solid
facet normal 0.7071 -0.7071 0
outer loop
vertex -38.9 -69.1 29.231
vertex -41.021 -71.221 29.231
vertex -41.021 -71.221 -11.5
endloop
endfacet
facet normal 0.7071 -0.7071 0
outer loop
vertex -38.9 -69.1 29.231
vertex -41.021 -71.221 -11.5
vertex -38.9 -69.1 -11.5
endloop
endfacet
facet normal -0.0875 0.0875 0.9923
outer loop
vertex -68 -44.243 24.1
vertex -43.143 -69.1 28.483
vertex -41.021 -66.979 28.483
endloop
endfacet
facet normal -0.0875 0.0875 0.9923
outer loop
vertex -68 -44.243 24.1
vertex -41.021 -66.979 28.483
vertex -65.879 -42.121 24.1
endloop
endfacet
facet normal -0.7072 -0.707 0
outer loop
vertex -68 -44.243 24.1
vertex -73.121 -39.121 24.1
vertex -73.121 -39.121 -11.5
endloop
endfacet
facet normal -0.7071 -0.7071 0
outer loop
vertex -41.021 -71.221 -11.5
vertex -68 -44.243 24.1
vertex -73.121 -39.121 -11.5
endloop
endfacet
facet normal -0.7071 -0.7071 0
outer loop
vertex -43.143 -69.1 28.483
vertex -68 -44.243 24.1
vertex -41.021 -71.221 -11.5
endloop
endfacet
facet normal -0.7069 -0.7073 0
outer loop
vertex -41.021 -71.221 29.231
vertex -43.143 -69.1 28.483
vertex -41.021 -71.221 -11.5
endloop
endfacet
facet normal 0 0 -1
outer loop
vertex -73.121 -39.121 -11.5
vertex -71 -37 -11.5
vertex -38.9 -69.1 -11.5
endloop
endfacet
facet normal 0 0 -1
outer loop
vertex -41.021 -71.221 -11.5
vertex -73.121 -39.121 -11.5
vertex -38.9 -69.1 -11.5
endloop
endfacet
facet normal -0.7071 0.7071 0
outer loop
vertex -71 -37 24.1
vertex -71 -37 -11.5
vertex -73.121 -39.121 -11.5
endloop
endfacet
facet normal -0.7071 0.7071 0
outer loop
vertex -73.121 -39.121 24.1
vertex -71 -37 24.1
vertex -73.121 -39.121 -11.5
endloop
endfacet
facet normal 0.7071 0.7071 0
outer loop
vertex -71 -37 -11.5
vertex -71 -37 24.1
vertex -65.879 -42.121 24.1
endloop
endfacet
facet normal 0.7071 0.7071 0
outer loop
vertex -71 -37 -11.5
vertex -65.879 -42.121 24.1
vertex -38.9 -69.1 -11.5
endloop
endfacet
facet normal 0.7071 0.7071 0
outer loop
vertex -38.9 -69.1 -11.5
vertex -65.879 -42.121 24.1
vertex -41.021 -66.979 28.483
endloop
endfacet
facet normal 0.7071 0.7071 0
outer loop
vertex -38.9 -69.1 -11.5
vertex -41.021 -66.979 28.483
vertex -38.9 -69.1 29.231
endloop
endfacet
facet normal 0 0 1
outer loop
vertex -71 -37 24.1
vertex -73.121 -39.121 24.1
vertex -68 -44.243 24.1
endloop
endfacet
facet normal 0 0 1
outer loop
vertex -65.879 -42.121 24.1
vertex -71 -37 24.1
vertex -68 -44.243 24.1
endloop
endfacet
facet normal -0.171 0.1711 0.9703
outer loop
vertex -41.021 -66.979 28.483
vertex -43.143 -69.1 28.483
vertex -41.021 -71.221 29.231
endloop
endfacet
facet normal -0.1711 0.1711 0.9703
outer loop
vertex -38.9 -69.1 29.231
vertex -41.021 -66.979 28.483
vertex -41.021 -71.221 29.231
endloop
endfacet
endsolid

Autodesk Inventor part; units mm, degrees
ref_plane "YZ Plane" through (0, 0, 0) normal (1, 0, 0) x (0, 1, 0)
ref_plane "XZ Plane" through (0, 0, 0) normal (0, 1, 0) x (-1, 0, 0)
ref_plane "XY Plane" through (0, 0, 0) normal (0, 0, 1) x (1, 0, 0)
sketch "Esboço1" plane through (0, 0, 0) normal (0, 0, 1) x (1, 0, 0)
  line L0 (-71, -40) -> (-71, -37)
  line L1 (-71, -37) -> (-38.1386, -69.8614)
  line L2 (14.6, -69.1) -> (-41.9, -69.1) projected
  line L3 (-38.9, -69.1) -> (-71, -37)
  line L4 (-71, -37) -> (-73.1213, -39.1213)
  line L5 (-73.1213, -39.1213) -> (-41.0213, -71.2213)
  line L6 (-41.0213, -71.2213) -> (-38.9, -69.1)
  point P0 (0, 0)
  dimension "d0" = 3
  dimension "d1" = 45
  dimension "d2" = 3
extrude "Extrusão1" add sketch "Esboço1" against normal blind 11.5
sketch "Esboço3" plane through (0, 0, 0) normal (0, 0, 1) x (1, 0, 0)
  line L0 (-38.9, -69.1) -> (-41.0213, -71.2213) projected
  line L1 (-38.9, -69.1) -> (-71, -37)
  line L2 (-71, -37) -> (-73.1213, -39.1213)
  line L3 (-73.1213, -39.1213) -> (-41.0213, -71.2213)
  line L4 (-41.0213, -71.2213) -> (-38.9, -69.1)
  point P0 (0, 0)
extrude "Extrusão2" add sketch "Esboço3" along normal blind 35.6
sketch "Esboço6" plane through (-73.1213, -39.1213, 35.6) normal (-0.7071, -0.7071, 0) x (-0.7071, 0.7071, 0)
  line L0 (-42.3963, 7.117) -> (-7.2426, 11.5) projected
  line L1 (55.3259, 11.5) -> (-7.2426, 11.5) projected
  line L2 (-42.3963, 7.117) -> (-83.2265, -3.0646) projected
  line L3 (-45.3963, 0) -> (0, 0) projected
  line L4 (-45.3963, 47.1) -> (-45.3963, 0) projected
  line L5 (0, 0) -> (-45.3963, 0)
  line L6 (-45.3963, 0) -> (-45.3963, 14)
  line L7 (-45.3963, 14) -> (0, 14)
  line L8 (0, 14) -> (0, 0)
  point P0 (-24.0416, 35.6)
  point P1 (-45.3963, 6.3689)
  point P2 (0, 11.5)
extrude "Extrusão3" cut sketch "Esboço6" against normal blind 19 contours L0 L1 L8 L3 L4 L2
properties part number "diagonal"
